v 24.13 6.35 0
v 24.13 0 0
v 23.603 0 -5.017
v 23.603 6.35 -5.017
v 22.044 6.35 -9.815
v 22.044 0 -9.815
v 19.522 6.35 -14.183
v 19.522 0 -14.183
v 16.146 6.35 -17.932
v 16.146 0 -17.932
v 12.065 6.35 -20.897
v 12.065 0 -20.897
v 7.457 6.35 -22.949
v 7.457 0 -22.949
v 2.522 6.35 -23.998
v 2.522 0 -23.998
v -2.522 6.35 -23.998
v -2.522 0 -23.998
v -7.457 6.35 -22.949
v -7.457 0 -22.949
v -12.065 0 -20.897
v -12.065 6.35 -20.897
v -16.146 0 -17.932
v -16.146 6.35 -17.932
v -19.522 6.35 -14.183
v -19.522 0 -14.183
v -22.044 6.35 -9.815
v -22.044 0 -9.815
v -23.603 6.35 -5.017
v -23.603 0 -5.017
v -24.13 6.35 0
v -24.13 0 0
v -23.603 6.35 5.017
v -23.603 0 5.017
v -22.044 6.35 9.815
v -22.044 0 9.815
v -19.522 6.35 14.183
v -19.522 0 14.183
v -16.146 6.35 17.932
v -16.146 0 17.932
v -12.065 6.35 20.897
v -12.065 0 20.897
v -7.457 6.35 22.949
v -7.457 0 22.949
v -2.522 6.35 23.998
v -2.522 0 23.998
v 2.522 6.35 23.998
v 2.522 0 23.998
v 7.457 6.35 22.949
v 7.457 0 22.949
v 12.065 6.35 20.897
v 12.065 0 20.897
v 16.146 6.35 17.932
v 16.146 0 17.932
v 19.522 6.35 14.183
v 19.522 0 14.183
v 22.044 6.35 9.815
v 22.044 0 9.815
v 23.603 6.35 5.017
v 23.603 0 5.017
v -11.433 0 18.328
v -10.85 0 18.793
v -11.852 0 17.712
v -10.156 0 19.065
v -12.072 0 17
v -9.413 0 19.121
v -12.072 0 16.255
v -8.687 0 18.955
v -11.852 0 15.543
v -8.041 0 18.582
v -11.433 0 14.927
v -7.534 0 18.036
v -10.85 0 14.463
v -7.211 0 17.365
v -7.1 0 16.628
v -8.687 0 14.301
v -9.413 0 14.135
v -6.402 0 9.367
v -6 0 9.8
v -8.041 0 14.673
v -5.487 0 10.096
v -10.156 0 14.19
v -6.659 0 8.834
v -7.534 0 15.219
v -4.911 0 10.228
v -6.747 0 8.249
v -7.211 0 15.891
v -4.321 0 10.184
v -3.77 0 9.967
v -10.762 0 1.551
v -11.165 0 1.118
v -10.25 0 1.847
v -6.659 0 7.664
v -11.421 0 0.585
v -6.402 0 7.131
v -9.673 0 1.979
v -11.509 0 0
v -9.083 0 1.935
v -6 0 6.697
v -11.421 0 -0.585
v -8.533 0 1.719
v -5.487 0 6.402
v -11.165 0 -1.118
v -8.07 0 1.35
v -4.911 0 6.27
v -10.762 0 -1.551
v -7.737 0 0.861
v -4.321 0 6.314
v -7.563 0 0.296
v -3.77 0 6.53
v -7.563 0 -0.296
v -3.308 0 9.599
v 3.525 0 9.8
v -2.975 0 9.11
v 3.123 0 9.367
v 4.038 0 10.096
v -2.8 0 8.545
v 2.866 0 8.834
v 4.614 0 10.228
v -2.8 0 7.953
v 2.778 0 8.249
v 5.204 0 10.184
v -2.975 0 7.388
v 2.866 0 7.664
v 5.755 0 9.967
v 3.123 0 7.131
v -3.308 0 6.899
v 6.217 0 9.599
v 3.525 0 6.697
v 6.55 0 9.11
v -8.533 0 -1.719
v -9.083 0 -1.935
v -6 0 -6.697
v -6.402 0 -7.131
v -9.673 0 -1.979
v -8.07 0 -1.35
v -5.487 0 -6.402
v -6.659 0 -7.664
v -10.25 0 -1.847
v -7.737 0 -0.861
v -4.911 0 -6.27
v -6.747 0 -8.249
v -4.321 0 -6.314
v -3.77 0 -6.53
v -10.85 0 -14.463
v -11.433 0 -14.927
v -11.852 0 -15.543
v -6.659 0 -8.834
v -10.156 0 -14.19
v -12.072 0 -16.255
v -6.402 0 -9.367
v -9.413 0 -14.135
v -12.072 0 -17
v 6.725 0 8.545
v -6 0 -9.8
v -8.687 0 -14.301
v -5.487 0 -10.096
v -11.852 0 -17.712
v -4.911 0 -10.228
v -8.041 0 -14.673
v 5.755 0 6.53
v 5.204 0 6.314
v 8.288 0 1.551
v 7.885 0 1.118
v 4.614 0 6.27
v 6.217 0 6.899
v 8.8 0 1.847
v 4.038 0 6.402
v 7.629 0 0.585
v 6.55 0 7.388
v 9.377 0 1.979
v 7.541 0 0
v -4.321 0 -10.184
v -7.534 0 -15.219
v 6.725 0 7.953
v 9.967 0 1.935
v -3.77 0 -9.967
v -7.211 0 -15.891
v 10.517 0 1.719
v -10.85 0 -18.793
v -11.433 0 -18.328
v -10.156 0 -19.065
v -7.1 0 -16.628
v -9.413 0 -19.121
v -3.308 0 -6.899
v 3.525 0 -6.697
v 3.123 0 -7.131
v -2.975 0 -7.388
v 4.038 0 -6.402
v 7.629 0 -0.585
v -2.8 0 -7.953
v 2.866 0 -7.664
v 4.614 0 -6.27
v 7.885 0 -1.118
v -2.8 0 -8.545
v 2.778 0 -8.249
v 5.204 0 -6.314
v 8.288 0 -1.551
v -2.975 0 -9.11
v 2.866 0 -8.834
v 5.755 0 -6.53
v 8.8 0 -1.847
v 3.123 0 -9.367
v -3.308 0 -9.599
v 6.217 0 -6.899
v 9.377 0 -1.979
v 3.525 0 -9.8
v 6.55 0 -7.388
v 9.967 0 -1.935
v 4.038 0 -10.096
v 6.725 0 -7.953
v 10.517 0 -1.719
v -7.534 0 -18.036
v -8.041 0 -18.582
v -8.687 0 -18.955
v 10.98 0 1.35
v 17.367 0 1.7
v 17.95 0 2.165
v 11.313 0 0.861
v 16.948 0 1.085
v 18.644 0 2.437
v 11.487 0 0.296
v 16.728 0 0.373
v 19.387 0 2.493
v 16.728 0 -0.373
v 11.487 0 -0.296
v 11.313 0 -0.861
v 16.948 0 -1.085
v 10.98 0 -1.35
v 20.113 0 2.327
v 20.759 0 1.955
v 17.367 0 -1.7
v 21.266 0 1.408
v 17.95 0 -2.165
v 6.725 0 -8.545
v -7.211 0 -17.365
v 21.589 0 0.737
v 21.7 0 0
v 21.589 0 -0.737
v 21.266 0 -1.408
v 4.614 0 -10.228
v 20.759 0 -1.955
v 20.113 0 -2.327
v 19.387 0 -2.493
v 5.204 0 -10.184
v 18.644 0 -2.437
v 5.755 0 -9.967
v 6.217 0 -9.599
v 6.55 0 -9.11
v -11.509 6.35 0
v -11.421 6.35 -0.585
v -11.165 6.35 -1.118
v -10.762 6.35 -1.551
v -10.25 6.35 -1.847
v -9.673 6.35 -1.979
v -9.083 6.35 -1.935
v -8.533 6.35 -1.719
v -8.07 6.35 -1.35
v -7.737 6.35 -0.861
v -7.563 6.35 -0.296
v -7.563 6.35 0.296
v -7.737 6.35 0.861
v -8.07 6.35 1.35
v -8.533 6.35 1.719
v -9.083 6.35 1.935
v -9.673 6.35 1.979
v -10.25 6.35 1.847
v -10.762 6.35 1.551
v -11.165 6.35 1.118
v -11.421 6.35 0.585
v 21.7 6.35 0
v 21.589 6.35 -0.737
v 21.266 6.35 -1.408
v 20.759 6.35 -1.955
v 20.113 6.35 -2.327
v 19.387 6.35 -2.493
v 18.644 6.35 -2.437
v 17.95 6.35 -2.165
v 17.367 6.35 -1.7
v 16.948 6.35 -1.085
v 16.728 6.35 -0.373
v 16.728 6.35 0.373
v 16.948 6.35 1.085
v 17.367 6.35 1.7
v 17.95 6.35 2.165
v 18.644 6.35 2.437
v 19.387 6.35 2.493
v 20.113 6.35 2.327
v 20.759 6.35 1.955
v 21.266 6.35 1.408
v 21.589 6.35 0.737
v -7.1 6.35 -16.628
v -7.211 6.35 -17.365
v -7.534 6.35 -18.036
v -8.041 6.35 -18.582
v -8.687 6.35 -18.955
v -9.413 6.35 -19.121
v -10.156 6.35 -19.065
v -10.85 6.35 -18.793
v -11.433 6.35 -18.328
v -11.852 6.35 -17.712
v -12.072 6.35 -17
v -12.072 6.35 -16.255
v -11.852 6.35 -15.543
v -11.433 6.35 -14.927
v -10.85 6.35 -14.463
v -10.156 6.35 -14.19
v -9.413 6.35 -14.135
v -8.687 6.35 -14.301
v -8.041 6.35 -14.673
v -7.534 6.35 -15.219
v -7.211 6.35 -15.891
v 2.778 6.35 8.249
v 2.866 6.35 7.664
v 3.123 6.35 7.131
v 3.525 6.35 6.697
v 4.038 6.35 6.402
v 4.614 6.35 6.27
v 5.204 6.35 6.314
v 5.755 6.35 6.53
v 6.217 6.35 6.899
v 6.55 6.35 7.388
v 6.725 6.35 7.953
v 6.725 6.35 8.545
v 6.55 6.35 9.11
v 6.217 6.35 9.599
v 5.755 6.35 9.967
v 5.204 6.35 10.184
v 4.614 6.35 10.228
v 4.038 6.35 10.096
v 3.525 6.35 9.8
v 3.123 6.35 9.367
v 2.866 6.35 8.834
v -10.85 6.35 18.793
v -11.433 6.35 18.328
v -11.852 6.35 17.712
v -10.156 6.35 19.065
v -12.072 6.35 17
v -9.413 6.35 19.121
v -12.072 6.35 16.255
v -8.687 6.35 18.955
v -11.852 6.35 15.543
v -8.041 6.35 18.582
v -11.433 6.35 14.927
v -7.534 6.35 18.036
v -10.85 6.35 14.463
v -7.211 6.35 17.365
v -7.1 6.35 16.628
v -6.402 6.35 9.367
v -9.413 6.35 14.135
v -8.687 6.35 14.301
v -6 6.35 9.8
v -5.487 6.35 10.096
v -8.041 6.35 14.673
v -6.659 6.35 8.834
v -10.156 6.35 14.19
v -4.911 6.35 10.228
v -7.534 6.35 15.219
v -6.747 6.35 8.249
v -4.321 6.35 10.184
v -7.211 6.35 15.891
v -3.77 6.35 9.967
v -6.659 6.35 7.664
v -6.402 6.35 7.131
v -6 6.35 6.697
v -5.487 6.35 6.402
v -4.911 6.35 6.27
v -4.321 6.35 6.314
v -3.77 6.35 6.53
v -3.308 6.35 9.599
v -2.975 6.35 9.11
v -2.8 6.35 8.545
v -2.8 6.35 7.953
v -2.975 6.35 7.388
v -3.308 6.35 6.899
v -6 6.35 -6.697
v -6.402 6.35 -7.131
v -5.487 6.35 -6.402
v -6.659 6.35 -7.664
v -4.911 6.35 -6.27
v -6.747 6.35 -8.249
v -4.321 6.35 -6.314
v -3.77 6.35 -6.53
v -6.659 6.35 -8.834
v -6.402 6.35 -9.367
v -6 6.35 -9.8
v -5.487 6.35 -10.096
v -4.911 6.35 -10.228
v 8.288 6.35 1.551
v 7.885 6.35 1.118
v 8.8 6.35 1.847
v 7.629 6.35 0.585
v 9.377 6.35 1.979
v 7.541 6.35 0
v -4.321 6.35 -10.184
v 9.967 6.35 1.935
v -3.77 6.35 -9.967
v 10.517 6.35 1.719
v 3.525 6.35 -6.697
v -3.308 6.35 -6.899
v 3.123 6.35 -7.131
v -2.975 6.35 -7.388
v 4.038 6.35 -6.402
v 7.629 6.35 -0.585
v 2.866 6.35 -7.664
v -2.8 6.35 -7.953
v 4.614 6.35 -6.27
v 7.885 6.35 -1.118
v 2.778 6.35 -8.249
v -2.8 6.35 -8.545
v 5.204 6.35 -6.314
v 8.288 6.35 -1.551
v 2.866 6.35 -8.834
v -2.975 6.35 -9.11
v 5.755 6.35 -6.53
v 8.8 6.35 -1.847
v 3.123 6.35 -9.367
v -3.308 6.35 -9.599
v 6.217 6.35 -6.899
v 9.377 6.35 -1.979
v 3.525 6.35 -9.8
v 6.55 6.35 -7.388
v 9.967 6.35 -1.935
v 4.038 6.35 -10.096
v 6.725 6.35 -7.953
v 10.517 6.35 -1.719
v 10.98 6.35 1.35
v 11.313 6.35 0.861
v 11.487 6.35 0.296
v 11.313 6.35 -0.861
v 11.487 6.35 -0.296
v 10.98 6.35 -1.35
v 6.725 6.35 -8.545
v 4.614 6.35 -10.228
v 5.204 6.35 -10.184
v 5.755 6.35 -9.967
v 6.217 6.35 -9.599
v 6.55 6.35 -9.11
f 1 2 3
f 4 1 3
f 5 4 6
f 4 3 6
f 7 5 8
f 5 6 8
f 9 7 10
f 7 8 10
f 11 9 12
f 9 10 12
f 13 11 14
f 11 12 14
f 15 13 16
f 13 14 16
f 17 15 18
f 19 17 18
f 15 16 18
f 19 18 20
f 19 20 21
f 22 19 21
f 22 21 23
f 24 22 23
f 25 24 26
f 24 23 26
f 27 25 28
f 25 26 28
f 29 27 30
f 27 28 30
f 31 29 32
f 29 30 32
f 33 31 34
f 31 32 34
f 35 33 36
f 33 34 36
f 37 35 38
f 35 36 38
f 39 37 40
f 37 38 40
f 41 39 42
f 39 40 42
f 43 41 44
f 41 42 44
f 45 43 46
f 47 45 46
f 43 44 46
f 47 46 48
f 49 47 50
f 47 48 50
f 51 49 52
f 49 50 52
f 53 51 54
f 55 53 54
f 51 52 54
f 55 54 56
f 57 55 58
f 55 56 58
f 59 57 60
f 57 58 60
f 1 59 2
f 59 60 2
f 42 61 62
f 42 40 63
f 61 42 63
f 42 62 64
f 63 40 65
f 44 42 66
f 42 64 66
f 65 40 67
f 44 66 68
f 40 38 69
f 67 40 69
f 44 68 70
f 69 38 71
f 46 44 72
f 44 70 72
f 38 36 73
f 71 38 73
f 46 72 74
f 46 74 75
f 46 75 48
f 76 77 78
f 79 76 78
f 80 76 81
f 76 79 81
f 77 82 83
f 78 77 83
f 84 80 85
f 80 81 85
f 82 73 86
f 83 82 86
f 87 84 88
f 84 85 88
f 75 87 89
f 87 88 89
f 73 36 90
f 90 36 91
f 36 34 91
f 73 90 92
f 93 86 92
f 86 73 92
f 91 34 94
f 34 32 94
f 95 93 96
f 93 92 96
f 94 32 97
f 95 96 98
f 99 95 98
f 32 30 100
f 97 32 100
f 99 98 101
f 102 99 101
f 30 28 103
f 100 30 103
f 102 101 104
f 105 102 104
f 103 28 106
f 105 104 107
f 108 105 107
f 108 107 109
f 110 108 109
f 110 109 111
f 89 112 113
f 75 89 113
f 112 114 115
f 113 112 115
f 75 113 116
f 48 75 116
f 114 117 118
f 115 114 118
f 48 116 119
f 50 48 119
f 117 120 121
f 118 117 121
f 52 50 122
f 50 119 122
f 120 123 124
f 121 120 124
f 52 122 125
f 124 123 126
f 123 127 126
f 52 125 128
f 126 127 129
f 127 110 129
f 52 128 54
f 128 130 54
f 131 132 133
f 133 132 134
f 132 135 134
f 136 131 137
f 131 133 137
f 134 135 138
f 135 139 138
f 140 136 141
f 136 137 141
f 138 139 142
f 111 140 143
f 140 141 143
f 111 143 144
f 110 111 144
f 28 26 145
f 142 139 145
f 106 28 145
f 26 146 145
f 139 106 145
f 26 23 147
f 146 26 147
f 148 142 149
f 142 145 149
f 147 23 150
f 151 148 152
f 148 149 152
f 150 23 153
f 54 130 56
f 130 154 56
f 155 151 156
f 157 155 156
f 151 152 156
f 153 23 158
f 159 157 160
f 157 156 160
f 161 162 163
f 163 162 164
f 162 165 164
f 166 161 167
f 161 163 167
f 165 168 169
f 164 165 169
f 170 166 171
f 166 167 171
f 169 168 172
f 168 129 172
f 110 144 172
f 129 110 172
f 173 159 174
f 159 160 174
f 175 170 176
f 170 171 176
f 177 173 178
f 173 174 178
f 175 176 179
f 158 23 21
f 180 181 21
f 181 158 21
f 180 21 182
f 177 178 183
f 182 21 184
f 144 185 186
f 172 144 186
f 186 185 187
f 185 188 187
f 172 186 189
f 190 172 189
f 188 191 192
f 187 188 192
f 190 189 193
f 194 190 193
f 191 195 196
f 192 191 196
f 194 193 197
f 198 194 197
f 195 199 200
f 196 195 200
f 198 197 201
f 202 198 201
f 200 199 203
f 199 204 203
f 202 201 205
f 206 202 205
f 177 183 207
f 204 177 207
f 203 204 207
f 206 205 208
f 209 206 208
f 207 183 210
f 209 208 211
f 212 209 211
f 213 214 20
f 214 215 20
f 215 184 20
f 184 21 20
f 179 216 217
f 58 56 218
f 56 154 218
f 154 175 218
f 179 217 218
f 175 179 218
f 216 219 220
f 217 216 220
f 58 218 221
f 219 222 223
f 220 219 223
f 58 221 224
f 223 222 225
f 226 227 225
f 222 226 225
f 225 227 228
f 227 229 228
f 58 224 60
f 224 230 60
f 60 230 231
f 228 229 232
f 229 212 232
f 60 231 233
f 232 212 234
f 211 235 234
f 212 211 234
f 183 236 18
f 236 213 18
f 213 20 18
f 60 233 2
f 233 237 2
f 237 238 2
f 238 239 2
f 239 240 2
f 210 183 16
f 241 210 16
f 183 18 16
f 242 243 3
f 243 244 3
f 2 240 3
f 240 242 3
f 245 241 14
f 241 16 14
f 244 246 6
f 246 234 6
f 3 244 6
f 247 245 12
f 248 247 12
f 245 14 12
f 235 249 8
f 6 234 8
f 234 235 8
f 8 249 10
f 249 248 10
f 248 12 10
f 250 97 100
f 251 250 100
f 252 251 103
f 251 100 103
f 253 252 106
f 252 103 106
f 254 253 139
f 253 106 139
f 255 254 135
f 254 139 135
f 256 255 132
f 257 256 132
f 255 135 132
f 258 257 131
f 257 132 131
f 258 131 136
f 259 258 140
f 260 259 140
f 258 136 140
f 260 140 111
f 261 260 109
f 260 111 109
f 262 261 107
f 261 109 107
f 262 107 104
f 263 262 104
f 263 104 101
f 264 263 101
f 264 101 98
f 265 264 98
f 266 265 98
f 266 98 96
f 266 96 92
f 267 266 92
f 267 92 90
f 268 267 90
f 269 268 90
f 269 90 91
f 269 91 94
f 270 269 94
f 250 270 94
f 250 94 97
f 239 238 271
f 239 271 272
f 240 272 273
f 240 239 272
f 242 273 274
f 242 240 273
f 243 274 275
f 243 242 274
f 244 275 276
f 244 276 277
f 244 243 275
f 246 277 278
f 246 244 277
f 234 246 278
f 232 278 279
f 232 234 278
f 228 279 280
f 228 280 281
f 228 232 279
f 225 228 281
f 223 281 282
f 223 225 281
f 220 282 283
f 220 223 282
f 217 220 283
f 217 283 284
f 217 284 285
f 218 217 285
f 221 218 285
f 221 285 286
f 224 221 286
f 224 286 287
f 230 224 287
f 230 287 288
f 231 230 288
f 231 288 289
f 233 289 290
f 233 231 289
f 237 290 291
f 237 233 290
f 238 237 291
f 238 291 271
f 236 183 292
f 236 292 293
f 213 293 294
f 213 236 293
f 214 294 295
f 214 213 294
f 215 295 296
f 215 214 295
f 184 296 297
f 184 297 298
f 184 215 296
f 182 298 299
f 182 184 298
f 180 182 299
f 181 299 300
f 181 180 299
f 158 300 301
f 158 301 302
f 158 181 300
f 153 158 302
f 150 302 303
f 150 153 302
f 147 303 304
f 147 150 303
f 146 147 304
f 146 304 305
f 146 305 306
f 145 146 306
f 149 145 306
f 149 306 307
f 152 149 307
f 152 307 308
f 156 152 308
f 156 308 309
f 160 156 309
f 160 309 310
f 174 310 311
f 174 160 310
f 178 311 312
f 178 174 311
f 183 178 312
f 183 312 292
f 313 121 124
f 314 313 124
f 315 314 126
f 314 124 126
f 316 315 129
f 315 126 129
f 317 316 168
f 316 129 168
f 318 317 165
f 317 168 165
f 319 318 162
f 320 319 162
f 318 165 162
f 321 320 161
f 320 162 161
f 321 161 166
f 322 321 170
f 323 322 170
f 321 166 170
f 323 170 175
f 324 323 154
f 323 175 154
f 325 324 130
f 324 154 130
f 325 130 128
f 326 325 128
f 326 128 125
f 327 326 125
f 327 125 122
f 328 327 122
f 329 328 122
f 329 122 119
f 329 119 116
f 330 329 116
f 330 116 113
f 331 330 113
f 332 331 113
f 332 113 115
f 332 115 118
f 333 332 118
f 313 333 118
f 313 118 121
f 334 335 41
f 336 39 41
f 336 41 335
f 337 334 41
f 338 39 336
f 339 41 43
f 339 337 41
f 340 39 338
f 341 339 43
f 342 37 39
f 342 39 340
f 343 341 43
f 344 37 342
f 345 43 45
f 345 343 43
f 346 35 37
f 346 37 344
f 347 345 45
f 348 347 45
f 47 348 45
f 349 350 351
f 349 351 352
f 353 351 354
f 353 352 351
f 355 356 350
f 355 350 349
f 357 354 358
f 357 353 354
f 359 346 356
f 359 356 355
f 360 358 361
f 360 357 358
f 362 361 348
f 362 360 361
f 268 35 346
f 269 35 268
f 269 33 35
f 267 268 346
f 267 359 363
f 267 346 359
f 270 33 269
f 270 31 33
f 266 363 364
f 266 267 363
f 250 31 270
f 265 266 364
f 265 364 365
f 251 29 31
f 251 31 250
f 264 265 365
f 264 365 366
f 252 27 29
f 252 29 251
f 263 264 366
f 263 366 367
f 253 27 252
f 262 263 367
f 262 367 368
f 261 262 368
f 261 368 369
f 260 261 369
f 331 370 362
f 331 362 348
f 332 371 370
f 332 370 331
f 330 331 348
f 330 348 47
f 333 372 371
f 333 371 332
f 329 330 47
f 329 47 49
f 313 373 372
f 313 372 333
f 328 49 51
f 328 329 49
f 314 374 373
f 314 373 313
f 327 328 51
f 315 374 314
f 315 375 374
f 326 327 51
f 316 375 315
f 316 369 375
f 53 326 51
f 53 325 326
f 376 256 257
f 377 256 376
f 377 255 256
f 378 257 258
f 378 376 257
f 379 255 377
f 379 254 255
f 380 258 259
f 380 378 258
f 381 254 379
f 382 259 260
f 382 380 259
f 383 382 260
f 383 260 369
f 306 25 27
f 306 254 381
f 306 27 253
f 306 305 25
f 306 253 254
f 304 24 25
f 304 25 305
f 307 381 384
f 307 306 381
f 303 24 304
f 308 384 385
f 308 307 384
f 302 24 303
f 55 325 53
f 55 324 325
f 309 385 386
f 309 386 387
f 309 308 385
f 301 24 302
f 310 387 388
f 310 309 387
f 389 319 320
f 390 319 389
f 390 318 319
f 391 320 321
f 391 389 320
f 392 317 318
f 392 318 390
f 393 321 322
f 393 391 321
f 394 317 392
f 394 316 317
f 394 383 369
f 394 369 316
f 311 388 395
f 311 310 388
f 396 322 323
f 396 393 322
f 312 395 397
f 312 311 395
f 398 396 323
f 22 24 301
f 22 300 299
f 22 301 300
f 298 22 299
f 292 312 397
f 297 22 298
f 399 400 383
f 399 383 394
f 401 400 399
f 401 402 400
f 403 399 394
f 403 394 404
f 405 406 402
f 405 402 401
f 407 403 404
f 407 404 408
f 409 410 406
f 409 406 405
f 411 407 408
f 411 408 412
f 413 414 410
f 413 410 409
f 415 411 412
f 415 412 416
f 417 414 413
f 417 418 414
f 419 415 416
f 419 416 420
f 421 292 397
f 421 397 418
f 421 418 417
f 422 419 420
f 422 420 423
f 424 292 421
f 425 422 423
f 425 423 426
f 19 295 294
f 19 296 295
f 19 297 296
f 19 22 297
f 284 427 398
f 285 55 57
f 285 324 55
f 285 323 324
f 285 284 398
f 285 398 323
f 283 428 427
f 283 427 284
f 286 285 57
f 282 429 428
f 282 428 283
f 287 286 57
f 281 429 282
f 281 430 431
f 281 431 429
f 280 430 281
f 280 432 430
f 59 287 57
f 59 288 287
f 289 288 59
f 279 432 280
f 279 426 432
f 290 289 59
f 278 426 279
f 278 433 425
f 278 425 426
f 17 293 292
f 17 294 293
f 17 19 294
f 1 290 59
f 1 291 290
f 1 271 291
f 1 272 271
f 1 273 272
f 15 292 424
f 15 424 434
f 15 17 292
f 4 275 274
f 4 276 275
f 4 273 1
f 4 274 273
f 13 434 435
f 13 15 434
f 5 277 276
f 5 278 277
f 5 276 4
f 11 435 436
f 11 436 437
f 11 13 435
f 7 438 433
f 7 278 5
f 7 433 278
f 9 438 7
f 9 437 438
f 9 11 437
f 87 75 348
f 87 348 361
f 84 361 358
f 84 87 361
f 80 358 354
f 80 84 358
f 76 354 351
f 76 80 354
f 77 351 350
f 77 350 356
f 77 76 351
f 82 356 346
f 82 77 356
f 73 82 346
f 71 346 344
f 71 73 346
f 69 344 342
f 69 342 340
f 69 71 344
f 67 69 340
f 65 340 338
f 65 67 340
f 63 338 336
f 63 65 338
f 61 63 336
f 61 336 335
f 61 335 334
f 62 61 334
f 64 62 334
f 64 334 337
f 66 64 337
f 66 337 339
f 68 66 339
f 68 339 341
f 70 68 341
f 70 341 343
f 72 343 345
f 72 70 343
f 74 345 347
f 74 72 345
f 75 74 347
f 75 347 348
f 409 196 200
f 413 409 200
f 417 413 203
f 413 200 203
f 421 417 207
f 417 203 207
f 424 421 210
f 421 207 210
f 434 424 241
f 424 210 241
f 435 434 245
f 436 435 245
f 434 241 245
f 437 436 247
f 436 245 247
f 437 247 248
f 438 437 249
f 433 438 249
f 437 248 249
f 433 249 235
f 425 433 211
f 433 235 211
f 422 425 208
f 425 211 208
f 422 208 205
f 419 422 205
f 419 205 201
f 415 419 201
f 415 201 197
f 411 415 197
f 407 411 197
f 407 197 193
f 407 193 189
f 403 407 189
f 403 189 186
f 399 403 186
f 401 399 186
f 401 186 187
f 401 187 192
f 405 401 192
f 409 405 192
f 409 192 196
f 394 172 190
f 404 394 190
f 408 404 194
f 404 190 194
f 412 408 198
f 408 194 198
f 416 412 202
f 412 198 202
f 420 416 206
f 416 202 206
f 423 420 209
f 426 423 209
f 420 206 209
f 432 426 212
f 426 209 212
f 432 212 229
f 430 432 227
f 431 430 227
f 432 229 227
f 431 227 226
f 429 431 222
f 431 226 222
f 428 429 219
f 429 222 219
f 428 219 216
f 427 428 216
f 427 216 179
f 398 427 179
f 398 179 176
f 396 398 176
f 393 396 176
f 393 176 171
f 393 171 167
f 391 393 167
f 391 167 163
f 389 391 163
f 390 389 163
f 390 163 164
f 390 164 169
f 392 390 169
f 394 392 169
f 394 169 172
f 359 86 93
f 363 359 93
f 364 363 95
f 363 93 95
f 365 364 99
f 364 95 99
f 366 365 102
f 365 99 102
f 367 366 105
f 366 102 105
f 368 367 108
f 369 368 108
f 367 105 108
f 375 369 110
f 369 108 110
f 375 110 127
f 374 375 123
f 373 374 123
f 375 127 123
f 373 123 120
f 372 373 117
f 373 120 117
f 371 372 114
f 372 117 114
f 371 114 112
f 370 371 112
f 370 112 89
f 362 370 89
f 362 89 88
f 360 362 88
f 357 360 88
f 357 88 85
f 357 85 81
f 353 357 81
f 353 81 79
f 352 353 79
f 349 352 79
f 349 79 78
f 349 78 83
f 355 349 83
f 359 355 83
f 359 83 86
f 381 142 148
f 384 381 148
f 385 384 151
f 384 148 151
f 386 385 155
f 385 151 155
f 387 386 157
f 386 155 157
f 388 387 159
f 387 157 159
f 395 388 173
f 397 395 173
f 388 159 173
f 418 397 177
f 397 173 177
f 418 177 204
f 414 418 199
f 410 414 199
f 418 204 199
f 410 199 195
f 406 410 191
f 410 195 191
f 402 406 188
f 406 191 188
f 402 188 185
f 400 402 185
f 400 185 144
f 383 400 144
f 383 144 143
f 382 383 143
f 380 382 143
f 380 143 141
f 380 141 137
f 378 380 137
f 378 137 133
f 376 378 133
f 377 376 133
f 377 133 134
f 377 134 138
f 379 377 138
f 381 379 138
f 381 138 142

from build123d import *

# Parameters (mm, degrees)
SKETCH1_R                       = 24.13
SKETCH1_R_2                     = 2.5
BOSS_EXTRUDE1_DEPTH             = 6.35
F_5_32_0_15625_DIAMETER_HOLE1_D = 3.96875


with BuildPart() as part:
    # Sketch1 → Boss-Extrude1 (new body)
    with BuildSketch(Plane(origin=(0, 0, 0), x_dir=(1, 0, 0), z_dir=(0, 1, 0))):
        Circle(SKETCH1_R)
        with Locations((19.2, 0)):
            Circle(SKETCH1_R_2, mode=Mode.SUBTRACT)
        with Locations((-9.6, 16.627687753)):
            Circle(SKETCH1_R_2, mode=Mode.SUBTRACT)
        with Locations((-9.6, -16.627687753)):
            Circle(SKETCH1_R_2, mode=Mode.SUBTRACT)
    extrude(amount=BOSS_EXTRUDE1_DEPTH)

    # 5/32 (0.15625) Diameter Hole1 (through all)
    with Locations(Plane(origin=(0, 6.35, 0), x_dir=(1, 0, 0), z_dir=(0, 1, 0))):
        with Locations((4.7625, 8.248891971), (-4.7625, 8.248891971), (-9.525, 0), (-4.7625, -8.248891971), (4.7625, -8.248891971), (9.525, 0)):
            Hole(F_5_32_0_15625_DIAMETER_HOLE1_D / 2)


solid = part.part
